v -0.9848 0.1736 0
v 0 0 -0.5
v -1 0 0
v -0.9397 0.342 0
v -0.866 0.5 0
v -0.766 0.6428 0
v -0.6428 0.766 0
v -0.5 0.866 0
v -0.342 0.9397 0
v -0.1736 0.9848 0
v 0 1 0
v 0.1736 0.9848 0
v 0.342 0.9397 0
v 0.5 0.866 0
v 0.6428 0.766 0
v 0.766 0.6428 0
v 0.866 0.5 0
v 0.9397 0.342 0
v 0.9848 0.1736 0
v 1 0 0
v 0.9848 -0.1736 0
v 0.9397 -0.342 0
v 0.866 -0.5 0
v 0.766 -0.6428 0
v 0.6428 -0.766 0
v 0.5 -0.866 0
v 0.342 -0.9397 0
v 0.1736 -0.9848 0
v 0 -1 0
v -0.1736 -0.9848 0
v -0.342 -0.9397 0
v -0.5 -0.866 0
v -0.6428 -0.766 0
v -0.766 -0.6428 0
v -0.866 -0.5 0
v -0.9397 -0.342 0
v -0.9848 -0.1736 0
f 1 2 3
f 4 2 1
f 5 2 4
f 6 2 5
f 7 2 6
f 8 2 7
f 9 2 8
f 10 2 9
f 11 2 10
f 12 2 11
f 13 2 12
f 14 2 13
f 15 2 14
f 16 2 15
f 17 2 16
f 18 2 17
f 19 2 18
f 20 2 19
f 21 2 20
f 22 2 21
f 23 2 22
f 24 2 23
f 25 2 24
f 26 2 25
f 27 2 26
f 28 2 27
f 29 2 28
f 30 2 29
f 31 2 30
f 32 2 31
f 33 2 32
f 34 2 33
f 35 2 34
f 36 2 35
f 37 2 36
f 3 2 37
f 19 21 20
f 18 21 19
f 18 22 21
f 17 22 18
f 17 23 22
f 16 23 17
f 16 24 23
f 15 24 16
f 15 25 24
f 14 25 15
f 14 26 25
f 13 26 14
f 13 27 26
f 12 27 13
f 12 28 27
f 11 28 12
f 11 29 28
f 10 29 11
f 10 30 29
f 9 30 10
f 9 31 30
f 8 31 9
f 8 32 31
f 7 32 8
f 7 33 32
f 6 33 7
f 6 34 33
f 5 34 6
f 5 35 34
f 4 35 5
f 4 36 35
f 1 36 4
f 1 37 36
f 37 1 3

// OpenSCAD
$fn = 36;

module countersink(radius = 5, ratio=10) {
	d = 2 * radius;
	hthick = radius / ratio;
	difference() {
		cube(size=[d,d,hthick*2],center=true);
		translate([0,0,-hthick]) {
			cylinder(h=hthick*4,r1=radius,r2=0);
		}
	};
}



module counterbore(r, h) {
	rotate([0,180,0]) cylinder(h=h,r1=r,r2=0);
}

counterbore(1, 0.5);


/*
difference() {
	sphere(60);
	countersink(radius=50);
}
*/
